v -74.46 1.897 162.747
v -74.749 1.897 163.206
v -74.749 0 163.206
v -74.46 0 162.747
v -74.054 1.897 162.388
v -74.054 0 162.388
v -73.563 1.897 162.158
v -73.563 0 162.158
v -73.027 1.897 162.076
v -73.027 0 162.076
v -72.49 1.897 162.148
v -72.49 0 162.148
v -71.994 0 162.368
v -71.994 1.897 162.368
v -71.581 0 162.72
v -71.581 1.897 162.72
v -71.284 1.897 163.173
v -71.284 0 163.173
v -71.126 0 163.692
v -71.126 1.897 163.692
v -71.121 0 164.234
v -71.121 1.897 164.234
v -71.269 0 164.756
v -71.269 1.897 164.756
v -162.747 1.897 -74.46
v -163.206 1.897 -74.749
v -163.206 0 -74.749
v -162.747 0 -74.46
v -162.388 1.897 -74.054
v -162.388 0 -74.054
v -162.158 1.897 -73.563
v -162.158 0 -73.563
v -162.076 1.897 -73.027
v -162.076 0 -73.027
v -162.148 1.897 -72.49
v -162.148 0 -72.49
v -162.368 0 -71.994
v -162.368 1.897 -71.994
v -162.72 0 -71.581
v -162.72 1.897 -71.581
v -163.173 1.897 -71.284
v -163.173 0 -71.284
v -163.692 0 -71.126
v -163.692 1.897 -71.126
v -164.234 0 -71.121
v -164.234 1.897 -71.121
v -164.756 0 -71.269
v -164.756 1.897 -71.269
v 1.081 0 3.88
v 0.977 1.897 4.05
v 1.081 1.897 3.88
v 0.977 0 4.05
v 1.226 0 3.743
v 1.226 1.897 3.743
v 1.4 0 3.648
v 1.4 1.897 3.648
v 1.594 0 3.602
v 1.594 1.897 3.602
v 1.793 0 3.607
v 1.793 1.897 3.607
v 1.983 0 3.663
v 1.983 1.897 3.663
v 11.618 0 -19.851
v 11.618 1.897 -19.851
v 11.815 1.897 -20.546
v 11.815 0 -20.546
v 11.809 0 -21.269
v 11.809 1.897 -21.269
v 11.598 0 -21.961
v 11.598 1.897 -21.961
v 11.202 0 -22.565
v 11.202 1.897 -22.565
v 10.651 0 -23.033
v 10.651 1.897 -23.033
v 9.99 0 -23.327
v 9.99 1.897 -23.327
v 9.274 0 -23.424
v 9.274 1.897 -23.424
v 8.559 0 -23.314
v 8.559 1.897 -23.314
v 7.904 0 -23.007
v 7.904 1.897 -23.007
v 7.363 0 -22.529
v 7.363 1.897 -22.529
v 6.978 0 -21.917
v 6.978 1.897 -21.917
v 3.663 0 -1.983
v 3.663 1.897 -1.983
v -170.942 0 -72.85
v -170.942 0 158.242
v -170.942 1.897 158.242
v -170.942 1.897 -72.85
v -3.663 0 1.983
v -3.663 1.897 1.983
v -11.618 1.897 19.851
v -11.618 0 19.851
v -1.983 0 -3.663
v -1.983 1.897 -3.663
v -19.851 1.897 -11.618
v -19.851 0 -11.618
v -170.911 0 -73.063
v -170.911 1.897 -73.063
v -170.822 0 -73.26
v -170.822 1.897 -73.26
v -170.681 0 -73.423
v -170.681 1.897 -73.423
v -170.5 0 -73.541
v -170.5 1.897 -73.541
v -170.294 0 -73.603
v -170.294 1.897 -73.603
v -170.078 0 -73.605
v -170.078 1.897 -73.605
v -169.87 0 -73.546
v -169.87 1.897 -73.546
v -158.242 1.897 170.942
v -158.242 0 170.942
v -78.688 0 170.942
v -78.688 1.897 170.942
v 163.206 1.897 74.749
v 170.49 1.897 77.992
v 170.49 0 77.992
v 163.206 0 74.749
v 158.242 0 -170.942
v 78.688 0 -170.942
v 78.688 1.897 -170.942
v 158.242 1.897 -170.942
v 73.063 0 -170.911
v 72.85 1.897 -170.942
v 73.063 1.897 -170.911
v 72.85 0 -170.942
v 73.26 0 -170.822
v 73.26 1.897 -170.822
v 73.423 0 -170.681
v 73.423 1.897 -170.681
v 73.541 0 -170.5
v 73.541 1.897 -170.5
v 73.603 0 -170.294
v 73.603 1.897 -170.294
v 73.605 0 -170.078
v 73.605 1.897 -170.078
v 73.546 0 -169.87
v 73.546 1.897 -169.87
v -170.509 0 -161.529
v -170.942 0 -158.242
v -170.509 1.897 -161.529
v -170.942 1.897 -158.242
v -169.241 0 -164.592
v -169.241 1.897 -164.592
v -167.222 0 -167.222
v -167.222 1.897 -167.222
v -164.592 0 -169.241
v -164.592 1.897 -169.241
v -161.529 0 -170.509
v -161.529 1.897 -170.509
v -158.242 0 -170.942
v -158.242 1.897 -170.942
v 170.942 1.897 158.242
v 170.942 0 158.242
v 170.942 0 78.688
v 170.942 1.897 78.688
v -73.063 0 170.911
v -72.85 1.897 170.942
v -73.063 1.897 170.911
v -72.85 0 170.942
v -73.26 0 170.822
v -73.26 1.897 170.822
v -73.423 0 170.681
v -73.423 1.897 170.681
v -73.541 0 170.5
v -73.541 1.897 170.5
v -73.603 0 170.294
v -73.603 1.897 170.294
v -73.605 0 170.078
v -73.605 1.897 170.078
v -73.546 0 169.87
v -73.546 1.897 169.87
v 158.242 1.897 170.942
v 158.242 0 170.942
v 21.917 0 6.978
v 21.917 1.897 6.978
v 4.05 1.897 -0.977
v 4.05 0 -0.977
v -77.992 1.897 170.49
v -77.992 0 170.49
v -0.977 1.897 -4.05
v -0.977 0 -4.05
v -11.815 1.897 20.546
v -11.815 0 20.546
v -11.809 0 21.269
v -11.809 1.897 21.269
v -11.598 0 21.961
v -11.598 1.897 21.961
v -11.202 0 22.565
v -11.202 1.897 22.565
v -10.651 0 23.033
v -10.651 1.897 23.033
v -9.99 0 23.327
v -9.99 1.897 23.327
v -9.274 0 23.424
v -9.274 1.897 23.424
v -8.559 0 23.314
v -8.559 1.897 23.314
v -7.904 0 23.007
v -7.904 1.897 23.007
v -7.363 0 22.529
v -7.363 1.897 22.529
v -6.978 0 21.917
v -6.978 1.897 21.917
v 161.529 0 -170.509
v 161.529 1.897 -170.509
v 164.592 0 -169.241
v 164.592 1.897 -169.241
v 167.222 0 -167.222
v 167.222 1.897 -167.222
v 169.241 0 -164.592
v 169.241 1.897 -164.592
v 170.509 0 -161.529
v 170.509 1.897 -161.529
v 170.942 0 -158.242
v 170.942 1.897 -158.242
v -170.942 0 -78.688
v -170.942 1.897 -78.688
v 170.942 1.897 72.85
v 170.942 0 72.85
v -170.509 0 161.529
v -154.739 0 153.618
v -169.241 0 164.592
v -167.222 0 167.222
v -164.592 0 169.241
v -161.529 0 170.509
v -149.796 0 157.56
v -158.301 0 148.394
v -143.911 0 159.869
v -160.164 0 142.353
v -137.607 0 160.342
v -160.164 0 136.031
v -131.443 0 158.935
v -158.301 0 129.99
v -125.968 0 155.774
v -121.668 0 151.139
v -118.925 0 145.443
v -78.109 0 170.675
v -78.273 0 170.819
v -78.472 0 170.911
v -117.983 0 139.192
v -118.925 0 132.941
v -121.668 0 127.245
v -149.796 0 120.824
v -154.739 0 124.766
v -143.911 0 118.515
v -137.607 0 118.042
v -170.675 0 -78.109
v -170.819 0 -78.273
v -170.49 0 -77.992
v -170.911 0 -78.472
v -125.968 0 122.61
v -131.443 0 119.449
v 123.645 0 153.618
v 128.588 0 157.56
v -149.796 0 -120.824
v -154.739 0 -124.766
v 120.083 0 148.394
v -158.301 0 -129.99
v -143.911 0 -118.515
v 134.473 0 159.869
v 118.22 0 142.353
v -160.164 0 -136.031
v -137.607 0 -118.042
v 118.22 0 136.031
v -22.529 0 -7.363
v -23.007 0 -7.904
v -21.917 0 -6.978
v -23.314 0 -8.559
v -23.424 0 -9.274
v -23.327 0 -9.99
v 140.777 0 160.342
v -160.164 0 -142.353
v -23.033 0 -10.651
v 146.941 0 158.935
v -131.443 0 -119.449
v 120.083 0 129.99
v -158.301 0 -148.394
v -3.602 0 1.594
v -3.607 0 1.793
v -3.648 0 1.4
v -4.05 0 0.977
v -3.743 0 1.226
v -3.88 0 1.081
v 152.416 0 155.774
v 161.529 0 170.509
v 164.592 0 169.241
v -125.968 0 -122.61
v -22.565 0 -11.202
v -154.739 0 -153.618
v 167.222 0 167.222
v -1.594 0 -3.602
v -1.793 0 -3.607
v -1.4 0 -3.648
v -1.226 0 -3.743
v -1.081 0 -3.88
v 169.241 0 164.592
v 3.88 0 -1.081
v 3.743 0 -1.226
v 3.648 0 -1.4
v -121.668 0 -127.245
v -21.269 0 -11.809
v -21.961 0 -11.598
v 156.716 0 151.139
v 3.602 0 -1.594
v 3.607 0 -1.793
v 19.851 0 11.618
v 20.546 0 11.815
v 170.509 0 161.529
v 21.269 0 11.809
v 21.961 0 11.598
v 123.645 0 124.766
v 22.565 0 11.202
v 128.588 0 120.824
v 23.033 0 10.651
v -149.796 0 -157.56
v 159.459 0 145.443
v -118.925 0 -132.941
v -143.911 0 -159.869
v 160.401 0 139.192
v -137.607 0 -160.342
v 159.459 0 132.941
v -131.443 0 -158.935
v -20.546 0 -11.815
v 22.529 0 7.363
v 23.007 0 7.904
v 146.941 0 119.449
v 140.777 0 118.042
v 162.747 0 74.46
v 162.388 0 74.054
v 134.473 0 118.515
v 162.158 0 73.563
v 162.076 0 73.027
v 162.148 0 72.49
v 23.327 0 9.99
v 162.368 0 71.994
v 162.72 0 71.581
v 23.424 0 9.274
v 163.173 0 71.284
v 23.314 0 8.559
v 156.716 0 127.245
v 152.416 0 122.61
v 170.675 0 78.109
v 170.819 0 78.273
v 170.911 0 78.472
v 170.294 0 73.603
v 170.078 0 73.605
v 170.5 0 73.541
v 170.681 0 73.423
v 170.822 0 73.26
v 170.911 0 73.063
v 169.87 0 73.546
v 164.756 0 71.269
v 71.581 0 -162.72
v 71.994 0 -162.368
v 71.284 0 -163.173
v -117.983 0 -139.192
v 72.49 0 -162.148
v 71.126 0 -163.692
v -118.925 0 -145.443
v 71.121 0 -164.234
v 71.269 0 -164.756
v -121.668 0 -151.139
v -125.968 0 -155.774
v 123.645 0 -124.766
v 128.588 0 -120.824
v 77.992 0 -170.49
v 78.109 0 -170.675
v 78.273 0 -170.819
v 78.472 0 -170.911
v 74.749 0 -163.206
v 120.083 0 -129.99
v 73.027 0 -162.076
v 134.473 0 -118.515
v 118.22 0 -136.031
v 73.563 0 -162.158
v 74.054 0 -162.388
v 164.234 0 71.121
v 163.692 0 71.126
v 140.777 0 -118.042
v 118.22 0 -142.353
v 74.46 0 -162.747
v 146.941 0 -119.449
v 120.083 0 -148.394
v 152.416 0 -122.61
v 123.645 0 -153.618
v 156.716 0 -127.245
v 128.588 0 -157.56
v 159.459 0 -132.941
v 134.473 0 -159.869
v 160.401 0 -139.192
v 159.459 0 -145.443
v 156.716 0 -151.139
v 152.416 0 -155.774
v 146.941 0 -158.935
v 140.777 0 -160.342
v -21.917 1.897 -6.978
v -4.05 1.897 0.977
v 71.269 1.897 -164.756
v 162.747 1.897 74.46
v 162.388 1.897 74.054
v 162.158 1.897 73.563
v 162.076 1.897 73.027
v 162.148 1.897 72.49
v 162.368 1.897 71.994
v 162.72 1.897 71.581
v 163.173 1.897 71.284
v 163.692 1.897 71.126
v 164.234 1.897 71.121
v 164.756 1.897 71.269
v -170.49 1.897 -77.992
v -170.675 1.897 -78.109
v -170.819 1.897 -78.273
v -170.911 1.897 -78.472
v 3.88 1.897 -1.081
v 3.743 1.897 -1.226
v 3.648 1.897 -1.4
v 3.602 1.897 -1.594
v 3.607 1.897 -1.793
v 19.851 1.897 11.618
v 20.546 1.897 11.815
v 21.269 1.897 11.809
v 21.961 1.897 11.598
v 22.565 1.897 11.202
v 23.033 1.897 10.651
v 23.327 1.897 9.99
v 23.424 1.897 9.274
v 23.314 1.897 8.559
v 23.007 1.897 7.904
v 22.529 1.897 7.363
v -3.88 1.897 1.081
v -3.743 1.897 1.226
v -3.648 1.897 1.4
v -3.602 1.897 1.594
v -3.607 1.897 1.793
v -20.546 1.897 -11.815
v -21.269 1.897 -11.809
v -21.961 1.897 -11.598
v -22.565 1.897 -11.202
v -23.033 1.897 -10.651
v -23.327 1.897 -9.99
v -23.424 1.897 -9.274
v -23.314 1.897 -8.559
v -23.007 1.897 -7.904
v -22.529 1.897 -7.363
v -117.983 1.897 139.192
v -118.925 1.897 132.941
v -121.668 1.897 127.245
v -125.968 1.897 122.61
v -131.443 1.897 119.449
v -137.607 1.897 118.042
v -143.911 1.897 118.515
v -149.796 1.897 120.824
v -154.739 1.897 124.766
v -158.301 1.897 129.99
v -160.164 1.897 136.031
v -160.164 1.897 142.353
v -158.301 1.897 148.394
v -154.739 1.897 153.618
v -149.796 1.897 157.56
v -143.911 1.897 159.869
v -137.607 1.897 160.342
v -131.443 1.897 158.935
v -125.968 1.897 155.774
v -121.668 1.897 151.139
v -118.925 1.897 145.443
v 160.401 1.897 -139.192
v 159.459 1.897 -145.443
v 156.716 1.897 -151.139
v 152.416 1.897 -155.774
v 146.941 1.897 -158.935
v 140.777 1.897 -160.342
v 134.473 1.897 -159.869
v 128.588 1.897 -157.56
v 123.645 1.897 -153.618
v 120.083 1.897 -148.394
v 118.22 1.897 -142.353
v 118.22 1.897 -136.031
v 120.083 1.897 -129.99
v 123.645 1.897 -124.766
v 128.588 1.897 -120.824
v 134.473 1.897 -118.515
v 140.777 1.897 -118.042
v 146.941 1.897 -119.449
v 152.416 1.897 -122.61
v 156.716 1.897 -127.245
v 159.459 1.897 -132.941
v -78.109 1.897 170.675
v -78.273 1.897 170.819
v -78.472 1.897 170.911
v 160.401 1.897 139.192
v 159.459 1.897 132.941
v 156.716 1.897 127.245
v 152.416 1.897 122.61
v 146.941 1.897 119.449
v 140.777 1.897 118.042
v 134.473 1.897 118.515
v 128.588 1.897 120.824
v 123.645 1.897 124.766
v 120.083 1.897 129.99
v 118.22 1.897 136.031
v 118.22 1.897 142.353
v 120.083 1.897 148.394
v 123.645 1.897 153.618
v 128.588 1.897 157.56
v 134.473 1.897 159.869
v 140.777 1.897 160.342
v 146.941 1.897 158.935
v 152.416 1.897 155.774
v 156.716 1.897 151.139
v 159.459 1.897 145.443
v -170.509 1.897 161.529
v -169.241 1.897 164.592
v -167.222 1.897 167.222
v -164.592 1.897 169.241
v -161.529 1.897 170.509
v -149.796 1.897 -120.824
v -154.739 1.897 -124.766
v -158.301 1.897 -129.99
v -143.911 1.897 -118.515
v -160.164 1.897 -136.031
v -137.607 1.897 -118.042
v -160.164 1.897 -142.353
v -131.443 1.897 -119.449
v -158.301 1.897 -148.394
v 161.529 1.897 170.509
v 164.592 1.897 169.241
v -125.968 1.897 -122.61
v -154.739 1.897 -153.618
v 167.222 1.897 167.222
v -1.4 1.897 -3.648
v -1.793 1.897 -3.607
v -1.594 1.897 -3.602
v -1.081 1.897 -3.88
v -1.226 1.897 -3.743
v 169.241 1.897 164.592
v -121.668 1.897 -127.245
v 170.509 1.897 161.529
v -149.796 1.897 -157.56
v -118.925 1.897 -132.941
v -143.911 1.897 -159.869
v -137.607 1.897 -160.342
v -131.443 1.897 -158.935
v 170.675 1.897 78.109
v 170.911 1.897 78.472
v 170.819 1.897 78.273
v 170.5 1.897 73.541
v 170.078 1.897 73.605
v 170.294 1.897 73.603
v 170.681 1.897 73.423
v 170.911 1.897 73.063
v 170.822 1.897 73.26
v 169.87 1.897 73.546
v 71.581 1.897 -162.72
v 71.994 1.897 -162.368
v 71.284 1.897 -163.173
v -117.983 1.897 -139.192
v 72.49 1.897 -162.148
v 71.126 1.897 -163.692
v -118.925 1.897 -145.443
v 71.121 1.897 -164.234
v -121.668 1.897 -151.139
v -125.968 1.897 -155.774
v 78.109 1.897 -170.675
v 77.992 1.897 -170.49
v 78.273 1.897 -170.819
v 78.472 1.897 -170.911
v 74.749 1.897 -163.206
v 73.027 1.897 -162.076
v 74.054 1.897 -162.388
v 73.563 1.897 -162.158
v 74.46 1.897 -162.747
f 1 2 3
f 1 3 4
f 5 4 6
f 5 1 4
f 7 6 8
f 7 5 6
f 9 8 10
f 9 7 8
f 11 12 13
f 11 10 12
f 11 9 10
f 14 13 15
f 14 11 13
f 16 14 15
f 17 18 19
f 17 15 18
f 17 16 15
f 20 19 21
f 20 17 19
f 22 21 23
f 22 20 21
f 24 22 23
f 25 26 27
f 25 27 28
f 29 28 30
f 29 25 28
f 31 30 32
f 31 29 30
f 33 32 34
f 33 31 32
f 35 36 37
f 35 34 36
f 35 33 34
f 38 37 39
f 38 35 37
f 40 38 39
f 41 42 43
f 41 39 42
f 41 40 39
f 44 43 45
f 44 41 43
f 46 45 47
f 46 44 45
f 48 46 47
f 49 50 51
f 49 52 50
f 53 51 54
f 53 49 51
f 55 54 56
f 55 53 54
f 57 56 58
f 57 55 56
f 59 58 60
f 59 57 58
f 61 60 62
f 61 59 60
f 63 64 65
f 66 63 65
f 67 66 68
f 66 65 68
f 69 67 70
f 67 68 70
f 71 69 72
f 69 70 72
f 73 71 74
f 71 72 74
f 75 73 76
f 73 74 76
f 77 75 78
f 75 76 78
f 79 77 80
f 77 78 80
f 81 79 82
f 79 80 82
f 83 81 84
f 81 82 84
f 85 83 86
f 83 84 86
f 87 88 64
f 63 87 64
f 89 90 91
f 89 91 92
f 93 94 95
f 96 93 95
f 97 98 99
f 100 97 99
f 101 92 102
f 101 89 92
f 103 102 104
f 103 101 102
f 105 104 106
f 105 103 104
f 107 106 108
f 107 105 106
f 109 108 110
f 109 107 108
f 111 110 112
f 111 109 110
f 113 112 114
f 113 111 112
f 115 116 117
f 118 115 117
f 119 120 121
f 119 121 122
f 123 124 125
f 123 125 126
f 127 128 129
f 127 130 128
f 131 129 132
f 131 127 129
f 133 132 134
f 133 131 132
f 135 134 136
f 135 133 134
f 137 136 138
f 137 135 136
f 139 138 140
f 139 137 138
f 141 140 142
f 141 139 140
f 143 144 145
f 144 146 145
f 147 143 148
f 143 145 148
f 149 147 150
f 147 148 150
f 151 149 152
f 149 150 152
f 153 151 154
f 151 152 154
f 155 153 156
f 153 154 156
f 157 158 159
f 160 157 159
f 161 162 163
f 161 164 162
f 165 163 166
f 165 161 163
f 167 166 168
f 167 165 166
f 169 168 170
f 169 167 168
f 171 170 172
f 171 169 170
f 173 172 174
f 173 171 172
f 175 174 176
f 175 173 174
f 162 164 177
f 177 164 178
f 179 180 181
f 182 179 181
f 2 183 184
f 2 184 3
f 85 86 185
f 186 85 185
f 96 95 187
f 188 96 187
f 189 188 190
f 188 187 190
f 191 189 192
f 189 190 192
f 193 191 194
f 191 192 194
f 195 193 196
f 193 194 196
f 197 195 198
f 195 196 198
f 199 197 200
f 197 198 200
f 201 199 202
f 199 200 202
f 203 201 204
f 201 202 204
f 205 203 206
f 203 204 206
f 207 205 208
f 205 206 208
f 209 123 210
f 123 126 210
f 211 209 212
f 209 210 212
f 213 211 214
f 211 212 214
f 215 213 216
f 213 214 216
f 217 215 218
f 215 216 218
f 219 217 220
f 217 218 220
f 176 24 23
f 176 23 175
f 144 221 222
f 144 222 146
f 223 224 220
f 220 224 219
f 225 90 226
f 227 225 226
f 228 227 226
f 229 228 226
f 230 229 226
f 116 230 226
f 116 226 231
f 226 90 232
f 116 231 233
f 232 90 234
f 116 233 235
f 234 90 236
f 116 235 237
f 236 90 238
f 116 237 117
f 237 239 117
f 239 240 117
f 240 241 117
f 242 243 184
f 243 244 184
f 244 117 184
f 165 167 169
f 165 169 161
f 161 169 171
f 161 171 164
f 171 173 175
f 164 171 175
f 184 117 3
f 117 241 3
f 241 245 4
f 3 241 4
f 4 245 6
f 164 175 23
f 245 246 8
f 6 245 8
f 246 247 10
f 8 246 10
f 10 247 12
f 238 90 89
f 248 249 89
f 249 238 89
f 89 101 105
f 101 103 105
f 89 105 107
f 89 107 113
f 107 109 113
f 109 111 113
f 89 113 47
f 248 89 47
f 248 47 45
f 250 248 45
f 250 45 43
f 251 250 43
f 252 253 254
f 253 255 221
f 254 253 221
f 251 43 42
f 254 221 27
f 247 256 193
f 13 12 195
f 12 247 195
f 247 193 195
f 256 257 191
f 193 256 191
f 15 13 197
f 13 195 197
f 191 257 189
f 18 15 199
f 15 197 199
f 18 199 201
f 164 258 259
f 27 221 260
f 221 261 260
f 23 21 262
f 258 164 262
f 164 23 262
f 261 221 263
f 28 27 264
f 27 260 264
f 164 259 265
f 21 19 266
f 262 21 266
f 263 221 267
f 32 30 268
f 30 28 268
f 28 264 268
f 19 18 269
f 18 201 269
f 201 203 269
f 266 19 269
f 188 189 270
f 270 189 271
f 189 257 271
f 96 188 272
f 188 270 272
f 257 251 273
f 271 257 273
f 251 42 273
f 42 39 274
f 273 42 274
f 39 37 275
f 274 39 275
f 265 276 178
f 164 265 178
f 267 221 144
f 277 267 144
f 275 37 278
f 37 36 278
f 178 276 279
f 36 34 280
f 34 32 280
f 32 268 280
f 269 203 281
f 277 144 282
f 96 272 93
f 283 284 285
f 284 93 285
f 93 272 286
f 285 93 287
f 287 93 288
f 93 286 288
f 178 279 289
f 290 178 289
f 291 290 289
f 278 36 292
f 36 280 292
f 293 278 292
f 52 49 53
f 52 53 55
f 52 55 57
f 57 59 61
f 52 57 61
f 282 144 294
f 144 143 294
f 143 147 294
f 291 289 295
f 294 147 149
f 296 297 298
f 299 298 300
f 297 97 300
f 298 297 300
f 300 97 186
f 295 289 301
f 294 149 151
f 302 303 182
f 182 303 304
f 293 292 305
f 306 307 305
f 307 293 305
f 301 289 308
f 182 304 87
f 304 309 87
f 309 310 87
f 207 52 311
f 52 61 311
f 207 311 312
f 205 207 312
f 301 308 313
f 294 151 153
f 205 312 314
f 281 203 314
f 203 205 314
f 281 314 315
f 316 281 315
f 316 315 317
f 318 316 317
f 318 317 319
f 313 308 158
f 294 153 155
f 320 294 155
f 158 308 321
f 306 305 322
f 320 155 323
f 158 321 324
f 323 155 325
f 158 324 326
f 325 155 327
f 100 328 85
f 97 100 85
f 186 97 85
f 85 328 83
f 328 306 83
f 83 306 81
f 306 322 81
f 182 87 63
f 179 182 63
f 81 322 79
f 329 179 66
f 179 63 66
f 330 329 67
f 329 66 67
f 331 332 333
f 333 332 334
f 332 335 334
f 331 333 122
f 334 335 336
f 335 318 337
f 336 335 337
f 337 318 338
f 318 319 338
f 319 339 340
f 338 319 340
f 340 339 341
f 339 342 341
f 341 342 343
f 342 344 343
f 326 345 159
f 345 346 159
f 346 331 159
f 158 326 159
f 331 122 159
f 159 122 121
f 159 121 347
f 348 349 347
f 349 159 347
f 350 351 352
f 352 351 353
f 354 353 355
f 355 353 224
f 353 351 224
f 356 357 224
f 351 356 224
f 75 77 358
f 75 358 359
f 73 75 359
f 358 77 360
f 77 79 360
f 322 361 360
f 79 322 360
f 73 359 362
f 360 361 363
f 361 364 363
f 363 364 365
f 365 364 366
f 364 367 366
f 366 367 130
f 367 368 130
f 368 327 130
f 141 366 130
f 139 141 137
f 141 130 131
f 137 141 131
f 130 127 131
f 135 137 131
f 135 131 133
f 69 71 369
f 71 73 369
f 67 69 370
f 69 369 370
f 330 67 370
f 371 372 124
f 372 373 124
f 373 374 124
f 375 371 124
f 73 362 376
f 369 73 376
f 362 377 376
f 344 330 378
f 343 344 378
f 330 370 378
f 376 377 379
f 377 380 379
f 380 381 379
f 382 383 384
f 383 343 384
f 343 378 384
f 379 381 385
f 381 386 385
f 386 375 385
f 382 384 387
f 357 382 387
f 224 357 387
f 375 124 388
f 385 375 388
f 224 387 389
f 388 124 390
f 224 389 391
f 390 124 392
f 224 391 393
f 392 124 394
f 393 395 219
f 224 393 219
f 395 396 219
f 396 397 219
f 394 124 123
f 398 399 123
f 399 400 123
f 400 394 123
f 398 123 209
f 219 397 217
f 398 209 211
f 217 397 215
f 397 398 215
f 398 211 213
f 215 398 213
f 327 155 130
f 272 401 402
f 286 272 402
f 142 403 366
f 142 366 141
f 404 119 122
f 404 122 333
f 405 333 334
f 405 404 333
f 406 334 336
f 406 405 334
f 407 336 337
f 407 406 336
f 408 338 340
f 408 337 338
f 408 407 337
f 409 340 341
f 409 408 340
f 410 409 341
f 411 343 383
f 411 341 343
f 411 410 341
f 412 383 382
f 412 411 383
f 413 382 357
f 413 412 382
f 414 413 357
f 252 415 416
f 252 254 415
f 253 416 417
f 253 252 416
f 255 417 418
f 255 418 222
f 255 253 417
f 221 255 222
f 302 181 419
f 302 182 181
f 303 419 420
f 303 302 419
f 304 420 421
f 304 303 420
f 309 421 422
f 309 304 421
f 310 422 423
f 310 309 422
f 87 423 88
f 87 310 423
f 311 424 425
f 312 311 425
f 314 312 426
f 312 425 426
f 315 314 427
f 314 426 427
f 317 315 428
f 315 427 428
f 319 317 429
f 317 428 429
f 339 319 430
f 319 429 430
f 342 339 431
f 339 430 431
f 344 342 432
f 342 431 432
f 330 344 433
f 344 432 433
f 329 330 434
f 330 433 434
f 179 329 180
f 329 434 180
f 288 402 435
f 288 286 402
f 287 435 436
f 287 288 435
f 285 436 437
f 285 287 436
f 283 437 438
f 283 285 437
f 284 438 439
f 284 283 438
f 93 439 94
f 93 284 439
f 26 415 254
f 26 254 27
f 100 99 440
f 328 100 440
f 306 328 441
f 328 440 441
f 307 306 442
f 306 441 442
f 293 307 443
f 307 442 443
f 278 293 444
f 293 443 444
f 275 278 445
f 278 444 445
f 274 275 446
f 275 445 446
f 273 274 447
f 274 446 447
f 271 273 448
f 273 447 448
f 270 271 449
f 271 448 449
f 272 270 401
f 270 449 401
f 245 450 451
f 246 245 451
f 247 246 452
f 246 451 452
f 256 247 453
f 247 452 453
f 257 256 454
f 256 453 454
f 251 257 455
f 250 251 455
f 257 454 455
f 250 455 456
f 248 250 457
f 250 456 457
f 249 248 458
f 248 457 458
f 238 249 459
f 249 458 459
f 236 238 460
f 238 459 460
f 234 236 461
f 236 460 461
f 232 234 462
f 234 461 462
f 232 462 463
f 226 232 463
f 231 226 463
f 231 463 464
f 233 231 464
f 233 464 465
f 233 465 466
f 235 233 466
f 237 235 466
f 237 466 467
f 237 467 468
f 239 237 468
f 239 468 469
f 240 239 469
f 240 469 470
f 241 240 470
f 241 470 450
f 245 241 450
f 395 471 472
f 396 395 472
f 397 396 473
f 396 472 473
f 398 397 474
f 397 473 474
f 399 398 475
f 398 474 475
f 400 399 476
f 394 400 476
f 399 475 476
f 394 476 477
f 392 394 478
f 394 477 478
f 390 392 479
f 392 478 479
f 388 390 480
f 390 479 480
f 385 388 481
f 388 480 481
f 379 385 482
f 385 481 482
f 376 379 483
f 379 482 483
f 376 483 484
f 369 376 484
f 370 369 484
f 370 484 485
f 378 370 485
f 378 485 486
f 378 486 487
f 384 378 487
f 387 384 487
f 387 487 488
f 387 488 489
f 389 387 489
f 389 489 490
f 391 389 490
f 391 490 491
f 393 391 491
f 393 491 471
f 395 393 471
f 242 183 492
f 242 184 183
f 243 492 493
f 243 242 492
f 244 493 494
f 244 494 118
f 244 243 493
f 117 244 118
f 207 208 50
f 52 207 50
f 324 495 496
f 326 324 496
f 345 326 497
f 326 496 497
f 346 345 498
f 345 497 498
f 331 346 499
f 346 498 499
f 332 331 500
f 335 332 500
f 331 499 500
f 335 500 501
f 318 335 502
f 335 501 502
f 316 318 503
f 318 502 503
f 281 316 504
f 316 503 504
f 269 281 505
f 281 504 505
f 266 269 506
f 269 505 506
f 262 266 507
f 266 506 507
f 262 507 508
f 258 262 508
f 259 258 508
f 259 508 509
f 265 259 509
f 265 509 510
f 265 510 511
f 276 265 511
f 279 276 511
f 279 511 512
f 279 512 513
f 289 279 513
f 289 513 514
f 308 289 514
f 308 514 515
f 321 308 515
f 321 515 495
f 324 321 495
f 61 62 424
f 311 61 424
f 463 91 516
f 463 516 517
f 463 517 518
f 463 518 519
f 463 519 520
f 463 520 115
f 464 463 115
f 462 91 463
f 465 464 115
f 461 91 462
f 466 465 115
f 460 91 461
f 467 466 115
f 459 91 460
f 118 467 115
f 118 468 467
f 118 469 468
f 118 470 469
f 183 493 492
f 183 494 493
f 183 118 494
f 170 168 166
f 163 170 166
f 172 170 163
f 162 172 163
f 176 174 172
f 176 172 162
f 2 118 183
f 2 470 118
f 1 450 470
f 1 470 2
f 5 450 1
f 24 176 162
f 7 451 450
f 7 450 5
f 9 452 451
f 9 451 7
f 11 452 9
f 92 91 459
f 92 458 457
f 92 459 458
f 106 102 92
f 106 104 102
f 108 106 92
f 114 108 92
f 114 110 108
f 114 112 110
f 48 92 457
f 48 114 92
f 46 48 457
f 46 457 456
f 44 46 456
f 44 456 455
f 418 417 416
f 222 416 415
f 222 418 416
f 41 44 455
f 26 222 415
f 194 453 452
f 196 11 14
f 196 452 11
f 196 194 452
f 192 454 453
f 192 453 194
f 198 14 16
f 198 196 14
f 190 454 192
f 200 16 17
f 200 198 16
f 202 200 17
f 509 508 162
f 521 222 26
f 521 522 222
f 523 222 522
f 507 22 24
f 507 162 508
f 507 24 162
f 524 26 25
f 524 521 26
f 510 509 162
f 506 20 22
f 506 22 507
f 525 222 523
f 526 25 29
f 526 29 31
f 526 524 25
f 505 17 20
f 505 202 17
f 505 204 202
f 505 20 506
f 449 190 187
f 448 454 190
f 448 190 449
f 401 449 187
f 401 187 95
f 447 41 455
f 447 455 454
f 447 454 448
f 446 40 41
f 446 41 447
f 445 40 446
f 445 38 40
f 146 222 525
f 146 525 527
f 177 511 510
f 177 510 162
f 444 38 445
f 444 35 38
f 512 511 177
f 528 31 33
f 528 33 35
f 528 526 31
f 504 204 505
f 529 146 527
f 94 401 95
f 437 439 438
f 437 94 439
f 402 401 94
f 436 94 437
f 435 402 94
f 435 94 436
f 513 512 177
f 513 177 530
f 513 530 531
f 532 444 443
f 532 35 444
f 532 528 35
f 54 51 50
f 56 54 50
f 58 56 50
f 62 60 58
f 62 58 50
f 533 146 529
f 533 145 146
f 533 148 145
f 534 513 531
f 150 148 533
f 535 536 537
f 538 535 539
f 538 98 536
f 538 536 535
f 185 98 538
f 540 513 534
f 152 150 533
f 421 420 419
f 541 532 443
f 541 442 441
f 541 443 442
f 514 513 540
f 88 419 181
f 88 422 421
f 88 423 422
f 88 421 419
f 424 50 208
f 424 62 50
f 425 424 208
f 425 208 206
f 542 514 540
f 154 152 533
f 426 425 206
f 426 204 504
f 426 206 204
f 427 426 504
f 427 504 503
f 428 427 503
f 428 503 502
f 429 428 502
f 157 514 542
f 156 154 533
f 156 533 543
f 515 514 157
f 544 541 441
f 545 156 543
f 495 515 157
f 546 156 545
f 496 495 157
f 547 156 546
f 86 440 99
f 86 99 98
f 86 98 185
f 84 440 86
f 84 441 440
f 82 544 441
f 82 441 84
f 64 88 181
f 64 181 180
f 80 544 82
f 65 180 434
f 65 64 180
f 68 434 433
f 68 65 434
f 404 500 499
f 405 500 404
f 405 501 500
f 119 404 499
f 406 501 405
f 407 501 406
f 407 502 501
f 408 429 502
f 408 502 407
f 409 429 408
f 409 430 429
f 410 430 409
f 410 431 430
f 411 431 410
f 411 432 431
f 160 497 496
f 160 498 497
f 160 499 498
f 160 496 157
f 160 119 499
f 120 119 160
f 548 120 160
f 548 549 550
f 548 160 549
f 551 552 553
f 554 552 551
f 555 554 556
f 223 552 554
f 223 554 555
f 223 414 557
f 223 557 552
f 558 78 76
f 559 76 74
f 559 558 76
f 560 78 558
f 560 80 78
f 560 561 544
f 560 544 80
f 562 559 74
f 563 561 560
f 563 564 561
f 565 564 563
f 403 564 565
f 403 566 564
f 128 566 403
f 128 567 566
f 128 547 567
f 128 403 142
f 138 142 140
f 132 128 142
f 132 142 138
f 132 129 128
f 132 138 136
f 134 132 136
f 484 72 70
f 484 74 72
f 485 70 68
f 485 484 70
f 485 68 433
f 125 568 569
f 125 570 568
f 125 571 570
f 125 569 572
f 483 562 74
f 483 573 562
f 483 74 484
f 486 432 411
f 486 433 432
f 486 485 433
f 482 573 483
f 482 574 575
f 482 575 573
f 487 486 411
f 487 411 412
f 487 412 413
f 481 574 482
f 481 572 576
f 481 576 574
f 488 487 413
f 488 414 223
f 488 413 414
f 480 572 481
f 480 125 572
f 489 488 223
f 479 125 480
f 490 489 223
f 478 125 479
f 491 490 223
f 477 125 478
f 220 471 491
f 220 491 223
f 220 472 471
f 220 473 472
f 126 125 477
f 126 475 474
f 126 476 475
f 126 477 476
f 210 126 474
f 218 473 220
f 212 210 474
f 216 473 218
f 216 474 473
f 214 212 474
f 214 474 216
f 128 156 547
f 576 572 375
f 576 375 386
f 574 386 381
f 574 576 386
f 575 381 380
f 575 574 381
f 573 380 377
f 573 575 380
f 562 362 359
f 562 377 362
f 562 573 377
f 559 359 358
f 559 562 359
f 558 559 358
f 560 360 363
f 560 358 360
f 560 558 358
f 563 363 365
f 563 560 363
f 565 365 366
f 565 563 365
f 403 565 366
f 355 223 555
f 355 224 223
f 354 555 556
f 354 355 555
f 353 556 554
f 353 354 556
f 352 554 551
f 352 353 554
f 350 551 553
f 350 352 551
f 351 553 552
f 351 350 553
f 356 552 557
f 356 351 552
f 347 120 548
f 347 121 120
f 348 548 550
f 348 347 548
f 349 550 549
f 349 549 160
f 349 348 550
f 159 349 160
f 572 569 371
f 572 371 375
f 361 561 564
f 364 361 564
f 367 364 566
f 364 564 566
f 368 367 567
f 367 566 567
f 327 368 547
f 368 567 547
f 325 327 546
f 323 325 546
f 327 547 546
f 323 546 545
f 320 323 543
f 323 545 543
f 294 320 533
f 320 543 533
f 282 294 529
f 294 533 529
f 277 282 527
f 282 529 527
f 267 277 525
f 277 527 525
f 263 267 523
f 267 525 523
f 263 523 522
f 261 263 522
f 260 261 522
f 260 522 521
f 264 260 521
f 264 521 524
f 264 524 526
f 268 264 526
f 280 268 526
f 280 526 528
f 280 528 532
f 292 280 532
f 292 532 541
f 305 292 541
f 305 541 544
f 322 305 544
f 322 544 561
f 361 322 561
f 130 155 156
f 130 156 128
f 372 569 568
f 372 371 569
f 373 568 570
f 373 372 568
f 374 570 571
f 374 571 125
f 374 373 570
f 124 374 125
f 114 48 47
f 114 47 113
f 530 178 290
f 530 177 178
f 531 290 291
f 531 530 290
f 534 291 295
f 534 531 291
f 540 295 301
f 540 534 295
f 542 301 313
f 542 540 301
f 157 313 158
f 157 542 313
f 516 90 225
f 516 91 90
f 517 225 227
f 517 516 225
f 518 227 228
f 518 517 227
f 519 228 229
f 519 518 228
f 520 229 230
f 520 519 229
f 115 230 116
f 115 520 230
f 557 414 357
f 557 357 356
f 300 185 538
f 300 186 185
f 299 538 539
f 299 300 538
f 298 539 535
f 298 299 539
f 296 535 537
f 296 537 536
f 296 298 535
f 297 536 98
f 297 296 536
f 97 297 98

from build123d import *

# Parameters (mm, degrees)
SKETCH1_W           = 341.884
SKETCH1_H           = 341.884
BOSS_EXTRUDE1_DEPTH = 1.89738
SKETCH2_R           = 21.209
CUT_EXTRUDE1_DEPTH  = 2.89738
FILLET2_R           = 12.7
CUT_EXTRUDE3_DEPTH  = 2.89738
FILLET3_R           = 0.762


with BuildPart() as part:
    # Sketch1 → Boss-Extrude1 (new body)
    with BuildSketch(Plane(origin=(0, 0, 0), x_dir=(1, 0, 0), z_dir=(0, 1, 0))):
        Rectangle(SKETCH1_W, SKETCH1_H)
    extrude(amount=BOSS_EXTRUDE1_DEPTH)

    # Sketch2 → Cut-Extrude1 (cut, through all)
    with BuildSketch(Plane(origin=(0, 1.89738, 0), x_dir=(1, 0, 0), z_dir=(0, 1, 0))):
        with Locations((-139.192, -139.192)):
            Circle(SKETCH2_R)
        with Locations((-139.192, 139.192)):
            Circle(SKETCH2_R)
        with Locations((139.192, 139.192)):
            Circle(SKETCH2_R)
        with Locations((139.192, -139.192)):
            Circle(SKETCH2_R)
    extrude(amount=-CUT_EXTRUDE1_DEPTH, mode=Mode.SUBTRACT)

    # Fillet2
    fillet2_edges = [part.edges().sort_by_distance(p)[0] for p in [
        (-170.942, 0.94869, -170.942),
        (170.942, 0.94869, -170.942),
        (170.942, 0.94869, 170.942),
        (-170.942, 0.94869, 170.942),
    ]]
    fillet(fillet2_edges, radius=FILLET2_R)

    # Sketch6 → Cut-Extrude3 (cut, through all)
    with BuildSketch(Plane(origin=(0, 1.89738, 0), x_dir=(1, 0, 0), z_dir=(0, 1, 0))):
        with BuildLine():
            Line((6.977594198, 21.916760235), (-1.287294389, 3.353516536))
            Line((-1.287294389, 3.353516536), (-19.850538088, 11.618405123))
            ThreePointArc((-19.850538088, 11.618405123), (-23.204054624, 10.331110734), (-21.916760235, 6.977594198))
            Line((-21.916760235, 6.977594198), (-3.353516536, -1.287294389))
            Line((-3.353516536, -1.287294389), (-11.618405123, -19.850538088))
            ThreePointArc((-11.618405123, -19.850538088), (-10.331110734, -23.204054624), (-6.977594198, -21.916760235))
            Line((-6.977594198, -21.916760235), (1.287294389, -3.353516536))
            Line((1.287294389, -3.353516536), (19.850538088, -11.618405123))
            ThreePointArc((19.850538088, -11.618405123), (23.204054624, -10.331110734), (21.916760235, -6.977594198))
            Line((21.916760235, -6.977594198), (3.353516536, 1.287294389))
            Line((3.353516536, 1.287294389), (11.618405123, 19.850538088))
            ThreePointArc((11.618405123, 19.850538088), (10.331110734, 23.204054624), (6.977594198, 21.916760235))
        make_face()
        with BuildLine():
            Line((-170.942, 78.193564035), (-163.205950308, 74.749252801))
            ThreePointArc((-163.205950308, 74.749252801), (-162.240479516, 72.234115399), (-164.755616918, 71.268644607))
            Line((-164.755616918, 71.268644607), (-170.942, 74.022999813))
            Line((-170.942, 74.022999813), (-170.942, 78.193564035))
        make_face()
        with BuildLine():
            Line((74.022999813, 170.942), (78.193564035, 170.942))
            Line((78.193564035, 170.942), (74.749252801, 163.205950308))
            ThreePointArc((74.749252801, 163.205950308), (72.234115399, 162.240479516), (71.268644607, 164.755616918))
            Line((71.268644607, 164.755616918), (74.022999813, 170.942))
        make_face()
        with BuildLine():
            Line((170.942, -74.022999813), (170.942, -78.193564035))
            Line((170.942, -78.193564035), (163.205950308, -74.749252801))
            ThreePointArc((163.205950308, -74.749252801), (162.240479516, -72.234115399), (164.755616918, -71.268644607))
            Line((164.755616918, -71.268644607), (170.942, -74.022999813))
        make_face()
        with BuildLine():
            Line((-74.022999813, -170.942), (-78.193564035, -170.942))
            Line((-78.193564035, -170.942), (-74.749252801, -163.205950308))
            ThreePointArc((-74.749252801, -163.205950308), (-72.234115399, -162.240479516), (-71.268644607, -164.755616918))
            Line((-71.268644607, -164.755616918), (-74.022999813, -170.942))
        make_face()
    extrude(amount=-CUT_EXTRUDE3_DEPTH, mode=Mode.SUBTRACT)

    # Fillet3
    fillet3_edges = [part.edges().sort_by_distance(p)[0] for p in [
        (78.193564035, 0.94869, -170.942),
        (74.022999813, 0.94869, -170.942),
        (-170.942, 0.94869, -74.022999813),
        (-170.942, 0.94869, -78.193564035),
        (3.353516536, 0.94869, -1.287294389),
        (1.287294389, 0.94869, 3.353516536),
        (-3.353516536, 0.94869, 1.287294389),
        (-1.287294389, 0.94869, -3.353516536),
        (-78.193564035, 0.94869, 170.942),
        (-74.022999813, 0.94869, 170.942),
        (170.942, 0.94869, 78.193564035),
        (170.942, 0.94869, 74.022999813),
    ]]
    fillet(fillet3_edges, radius=FILLET3_R)


solid = part.part
